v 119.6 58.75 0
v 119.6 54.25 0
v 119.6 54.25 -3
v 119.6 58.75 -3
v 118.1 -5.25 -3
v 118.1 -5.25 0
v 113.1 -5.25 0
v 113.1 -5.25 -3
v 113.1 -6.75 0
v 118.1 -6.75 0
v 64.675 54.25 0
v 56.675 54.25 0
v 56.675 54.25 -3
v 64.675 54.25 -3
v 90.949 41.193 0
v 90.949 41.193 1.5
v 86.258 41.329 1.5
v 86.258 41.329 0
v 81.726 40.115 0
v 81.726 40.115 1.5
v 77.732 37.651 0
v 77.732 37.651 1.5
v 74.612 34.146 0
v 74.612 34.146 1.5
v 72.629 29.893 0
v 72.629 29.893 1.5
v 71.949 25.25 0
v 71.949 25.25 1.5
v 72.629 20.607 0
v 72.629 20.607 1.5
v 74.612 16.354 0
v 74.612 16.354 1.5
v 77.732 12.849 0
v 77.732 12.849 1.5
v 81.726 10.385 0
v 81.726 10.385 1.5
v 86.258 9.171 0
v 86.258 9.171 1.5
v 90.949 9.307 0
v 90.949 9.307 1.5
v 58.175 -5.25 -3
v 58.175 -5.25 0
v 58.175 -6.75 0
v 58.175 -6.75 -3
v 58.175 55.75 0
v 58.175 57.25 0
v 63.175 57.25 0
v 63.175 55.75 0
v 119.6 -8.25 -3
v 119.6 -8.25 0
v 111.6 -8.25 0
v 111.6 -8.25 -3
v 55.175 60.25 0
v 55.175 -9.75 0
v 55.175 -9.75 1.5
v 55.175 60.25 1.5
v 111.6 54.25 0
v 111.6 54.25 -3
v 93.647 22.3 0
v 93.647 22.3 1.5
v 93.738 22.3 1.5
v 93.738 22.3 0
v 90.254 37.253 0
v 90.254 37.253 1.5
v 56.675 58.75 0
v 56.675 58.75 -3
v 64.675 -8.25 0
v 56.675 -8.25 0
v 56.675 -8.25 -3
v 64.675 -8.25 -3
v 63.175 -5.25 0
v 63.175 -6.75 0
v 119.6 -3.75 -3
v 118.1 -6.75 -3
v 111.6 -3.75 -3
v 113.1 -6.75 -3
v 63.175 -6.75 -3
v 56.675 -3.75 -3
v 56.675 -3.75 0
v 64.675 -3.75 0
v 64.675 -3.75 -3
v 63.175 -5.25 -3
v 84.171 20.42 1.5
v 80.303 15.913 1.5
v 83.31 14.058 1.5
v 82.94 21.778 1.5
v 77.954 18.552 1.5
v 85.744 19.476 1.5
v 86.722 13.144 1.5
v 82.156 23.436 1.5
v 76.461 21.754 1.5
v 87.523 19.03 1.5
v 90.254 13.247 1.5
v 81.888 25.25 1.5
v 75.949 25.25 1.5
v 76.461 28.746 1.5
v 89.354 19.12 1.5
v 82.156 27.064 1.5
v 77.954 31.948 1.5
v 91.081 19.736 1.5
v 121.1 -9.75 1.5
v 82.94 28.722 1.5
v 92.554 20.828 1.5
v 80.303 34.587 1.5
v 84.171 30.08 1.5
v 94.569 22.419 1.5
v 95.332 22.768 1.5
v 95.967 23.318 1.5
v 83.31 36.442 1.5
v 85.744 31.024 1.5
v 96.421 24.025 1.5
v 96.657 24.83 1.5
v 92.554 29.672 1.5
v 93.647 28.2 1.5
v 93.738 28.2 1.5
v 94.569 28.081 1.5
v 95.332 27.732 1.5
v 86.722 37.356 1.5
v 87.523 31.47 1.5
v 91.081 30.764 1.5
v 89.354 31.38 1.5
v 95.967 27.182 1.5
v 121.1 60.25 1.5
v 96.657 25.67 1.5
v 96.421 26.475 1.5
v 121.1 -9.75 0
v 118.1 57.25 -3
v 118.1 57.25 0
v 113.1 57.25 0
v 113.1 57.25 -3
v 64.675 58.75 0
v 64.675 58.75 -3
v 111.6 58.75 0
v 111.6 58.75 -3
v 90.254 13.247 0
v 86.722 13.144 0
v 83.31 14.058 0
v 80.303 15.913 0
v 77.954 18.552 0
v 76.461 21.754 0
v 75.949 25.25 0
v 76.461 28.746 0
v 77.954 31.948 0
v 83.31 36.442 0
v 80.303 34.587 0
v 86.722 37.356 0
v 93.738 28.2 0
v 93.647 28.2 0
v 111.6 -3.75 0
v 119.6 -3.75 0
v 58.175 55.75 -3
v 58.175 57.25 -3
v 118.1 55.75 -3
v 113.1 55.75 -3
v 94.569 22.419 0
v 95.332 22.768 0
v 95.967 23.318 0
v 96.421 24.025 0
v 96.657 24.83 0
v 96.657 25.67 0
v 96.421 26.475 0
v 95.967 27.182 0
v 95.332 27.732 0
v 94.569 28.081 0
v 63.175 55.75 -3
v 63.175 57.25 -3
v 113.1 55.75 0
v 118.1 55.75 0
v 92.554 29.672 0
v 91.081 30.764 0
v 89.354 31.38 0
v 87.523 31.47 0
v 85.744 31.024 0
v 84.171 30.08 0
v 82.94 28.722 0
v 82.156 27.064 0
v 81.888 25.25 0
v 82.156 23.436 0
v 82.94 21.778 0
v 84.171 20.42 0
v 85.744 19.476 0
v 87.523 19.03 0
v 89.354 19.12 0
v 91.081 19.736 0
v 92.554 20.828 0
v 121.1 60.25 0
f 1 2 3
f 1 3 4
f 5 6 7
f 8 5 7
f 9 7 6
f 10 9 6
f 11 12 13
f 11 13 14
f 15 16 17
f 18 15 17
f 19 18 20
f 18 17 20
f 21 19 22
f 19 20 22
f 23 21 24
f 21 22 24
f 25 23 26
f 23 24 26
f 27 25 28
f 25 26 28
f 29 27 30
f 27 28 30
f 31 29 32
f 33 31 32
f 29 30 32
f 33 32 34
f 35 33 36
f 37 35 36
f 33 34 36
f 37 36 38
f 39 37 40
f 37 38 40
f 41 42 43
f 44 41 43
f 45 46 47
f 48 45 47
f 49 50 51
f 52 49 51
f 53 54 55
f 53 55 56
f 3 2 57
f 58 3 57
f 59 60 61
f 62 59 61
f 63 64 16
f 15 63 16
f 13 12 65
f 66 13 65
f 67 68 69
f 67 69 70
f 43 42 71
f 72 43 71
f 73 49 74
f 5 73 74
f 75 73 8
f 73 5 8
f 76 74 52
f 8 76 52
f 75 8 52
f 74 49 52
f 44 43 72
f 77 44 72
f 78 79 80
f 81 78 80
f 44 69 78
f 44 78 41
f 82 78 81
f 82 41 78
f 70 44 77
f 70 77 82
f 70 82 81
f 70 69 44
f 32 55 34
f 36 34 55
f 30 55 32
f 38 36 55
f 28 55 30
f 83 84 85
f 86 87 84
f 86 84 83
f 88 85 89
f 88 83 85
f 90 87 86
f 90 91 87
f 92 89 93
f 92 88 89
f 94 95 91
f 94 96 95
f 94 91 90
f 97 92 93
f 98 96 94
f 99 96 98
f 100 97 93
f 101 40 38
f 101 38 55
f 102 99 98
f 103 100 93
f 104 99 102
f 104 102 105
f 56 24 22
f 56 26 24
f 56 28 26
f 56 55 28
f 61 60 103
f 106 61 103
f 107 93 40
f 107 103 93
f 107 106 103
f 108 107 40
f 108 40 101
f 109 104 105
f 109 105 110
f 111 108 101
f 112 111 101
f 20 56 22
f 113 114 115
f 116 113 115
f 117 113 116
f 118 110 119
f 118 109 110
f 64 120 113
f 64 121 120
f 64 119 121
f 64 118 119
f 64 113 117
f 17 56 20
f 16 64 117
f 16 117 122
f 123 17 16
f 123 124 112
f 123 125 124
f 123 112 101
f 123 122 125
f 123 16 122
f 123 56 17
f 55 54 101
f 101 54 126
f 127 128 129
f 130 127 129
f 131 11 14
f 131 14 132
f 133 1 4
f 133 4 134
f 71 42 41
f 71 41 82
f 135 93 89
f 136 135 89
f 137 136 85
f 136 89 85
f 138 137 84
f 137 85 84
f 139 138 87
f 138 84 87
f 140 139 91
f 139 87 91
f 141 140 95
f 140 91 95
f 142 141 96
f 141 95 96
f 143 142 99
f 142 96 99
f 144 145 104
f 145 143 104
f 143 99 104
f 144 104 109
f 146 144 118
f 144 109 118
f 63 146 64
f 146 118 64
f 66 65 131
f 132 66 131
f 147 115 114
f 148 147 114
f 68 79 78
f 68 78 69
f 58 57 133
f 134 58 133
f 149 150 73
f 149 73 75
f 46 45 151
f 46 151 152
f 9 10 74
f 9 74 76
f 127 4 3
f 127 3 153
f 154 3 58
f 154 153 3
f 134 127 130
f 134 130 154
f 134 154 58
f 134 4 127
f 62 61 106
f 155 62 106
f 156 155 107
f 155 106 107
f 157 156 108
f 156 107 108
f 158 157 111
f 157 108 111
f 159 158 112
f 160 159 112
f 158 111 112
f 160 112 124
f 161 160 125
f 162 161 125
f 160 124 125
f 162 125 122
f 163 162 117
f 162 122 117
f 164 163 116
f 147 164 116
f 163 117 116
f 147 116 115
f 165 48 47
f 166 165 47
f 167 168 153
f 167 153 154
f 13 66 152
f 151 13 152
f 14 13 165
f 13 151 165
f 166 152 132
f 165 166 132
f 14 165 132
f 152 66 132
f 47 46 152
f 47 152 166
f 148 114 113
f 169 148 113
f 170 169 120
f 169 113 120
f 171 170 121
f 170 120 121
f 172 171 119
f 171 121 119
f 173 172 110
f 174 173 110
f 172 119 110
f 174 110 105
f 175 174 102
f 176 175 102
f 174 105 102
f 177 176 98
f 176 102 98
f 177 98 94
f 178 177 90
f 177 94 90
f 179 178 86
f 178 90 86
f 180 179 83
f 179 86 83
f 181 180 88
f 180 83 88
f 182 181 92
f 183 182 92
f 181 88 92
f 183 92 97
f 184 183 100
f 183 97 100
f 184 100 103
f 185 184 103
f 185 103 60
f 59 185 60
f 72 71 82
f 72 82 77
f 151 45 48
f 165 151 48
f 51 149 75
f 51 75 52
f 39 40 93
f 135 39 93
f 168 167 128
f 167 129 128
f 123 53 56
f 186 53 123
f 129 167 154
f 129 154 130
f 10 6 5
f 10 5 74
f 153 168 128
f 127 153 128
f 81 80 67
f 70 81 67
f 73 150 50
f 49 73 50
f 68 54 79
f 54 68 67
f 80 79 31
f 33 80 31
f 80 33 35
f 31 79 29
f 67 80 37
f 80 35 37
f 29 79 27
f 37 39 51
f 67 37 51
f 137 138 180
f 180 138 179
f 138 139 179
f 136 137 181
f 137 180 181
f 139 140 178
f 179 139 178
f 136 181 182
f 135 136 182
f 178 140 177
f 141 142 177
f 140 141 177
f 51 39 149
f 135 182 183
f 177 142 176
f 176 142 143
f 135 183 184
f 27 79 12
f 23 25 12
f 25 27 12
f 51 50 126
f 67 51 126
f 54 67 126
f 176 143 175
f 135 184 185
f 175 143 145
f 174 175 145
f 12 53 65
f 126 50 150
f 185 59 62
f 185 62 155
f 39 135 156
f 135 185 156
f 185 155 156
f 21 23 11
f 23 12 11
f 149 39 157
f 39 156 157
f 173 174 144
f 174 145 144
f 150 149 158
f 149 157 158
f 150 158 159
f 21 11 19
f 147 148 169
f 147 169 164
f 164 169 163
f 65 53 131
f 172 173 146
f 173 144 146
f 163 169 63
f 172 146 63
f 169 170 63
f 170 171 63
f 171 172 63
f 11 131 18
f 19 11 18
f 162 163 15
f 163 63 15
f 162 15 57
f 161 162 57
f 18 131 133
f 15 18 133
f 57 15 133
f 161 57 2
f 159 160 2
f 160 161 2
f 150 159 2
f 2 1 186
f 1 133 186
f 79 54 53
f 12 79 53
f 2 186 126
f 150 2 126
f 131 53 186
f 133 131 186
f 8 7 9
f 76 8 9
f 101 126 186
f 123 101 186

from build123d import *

# Parameters (mm, degrees)
SKETCH1_W                 = 65.925
SKETCH1_H                 = 70
BOSS_EXTRUDE1_DEPTH       = 1.5
CUT_EXTRUDE1_REACH        = 137.268
SKETCH4_W                 = 8
SKETCH4_H                 = 4.5
SKETCH4_W_2               = 5
SKETCH4_H_2               = 1.5
BOSS_EXTRUDE2_DEPTH       = 3
MIRROR2_COPY_1_SKETCH_W   = 8
MIRROR2_COPY_1_SKETCH_H   = 4.5
MIRROR2_COPY_1_SKETCH_W_2 = 5
MIRROR2_COPY_1_SKETCH_H_2 = 1.5
MIRROR2_COPY_1_DEPTH      = 3
CUT_EXTRUDE2_DEPTH        = 136.334853235


with BuildPart() as part:
    # Sketch1 → Boss-Extrude1 (new body)
    with BuildSketch(Plane.XY):
        with Locations((88.1375, 25.25)):
            Rectangle(SKETCH1_W, SKETCH1_H)
    extrude(amount=BOSS_EXTRUDE1_DEPTH)

    # Sketch2 → Cut-Extrude1 (cut, up to next)
    with BuildSketch(Plane.XY.offset(1.5), mode=Mode.PRIVATE) as cut_extrude1_sk1:
        with BuildLine():
            Line((93.647490926, 22.3), (93.7375, 22.3))
            ThreePointArc((93.7375, 22.3), (96.6875, 25.25), (93.7375, 28.2))
            Line((93.7375, 28.2), (93.647490926, 28.2))
            ThreePointArc((93.647490926, 28.2), (81.8875, 25.25), (93.647490926, 22.3))
        make_face()
    cut_extrude1_tool1 = extrude(cut_extrude1_sk1.sketch, amount=-CUT_EXTRUDE1_REACH, mode=Mode.PRIVATE) & part.part
    add(cut_extrude1_tool1.solids().sort_by_distance((88.730915, 25.25, 1.5))[0], mode=Mode.SUBTRACT)

    # Sketch4 → Boss-Extrude2 (add)
    with BuildSketch(Plane(origin=(0, 0, 0), x_dir=(-1, 0, 0), z_dir=(0, 0, -1))):
        with Locations((-115.6, 56.5)):
            Rectangle(SKETCH4_W, SKETCH4_H)
        with Locations((-115.6, 56.5)):
            Rectangle(SKETCH4_W_2, SKETCH4_H_2, mode=Mode.SUBTRACT)
    boss_extrude2 = extrude(amount=BOSS_EXTRUDE2_DEPTH)

    # Mirror1: Boss-Extrude2 across plane
    add(boss_extrude2.mirror(Plane(origin=(88.1375, 0, 0), x_dir=(0, 0, 1), z_dir=(1, 0, 0))))

    # Mirror2: Boss-Extrude2 across plane
    add(boss_extrude2.mirror(Plane.ZX.offset(25.25)))

    # Mirror2 copy 1 sketch → Mirror2 copy 1 (add)
    with BuildSketch(Plane(origin=(176.275, 50.5, 0), x_dir=(1, 0, 0), z_dir=(0, 0, -1))):
        with Locations((-115.6, 56.5)):
            Rectangle(MIRROR2_COPY_1_SKETCH_W, MIRROR2_COPY_1_SKETCH_H)
        with Locations((-115.6, 56.5)):
            Rectangle(MIRROR2_COPY_1_SKETCH_W_2, MIRROR2_COPY_1_SKETCH_H_2, mode=Mode.SUBTRACT)
    extrude(amount=MIRROR2_COPY_1_DEPTH)

    # Sketch5 → Cut-Extrude2 (cut, through all)
    with BuildSketch(Plane.XY.offset(1.5)):
        with BuildLine():
            Line((90.254036985, 37.253477721), (90.948629695, 41.192708733))
            ThreePointArc((90.948629695, 41.192708733), (71.948849287, 25.25), (90.948629695, 9.307291267))
            Line((90.948629695, 9.307291267), (90.254036985, 13.246522279))
            ThreePointArc((90.254036985, 13.246522279), (75.948849287, 25.25), (90.254036985, 37.253477721))
        make_face()
    extrude(amount=-CUT_EXTRUDE2_DEPTH, mode=Mode.SUBTRACT)


solid = part.part
